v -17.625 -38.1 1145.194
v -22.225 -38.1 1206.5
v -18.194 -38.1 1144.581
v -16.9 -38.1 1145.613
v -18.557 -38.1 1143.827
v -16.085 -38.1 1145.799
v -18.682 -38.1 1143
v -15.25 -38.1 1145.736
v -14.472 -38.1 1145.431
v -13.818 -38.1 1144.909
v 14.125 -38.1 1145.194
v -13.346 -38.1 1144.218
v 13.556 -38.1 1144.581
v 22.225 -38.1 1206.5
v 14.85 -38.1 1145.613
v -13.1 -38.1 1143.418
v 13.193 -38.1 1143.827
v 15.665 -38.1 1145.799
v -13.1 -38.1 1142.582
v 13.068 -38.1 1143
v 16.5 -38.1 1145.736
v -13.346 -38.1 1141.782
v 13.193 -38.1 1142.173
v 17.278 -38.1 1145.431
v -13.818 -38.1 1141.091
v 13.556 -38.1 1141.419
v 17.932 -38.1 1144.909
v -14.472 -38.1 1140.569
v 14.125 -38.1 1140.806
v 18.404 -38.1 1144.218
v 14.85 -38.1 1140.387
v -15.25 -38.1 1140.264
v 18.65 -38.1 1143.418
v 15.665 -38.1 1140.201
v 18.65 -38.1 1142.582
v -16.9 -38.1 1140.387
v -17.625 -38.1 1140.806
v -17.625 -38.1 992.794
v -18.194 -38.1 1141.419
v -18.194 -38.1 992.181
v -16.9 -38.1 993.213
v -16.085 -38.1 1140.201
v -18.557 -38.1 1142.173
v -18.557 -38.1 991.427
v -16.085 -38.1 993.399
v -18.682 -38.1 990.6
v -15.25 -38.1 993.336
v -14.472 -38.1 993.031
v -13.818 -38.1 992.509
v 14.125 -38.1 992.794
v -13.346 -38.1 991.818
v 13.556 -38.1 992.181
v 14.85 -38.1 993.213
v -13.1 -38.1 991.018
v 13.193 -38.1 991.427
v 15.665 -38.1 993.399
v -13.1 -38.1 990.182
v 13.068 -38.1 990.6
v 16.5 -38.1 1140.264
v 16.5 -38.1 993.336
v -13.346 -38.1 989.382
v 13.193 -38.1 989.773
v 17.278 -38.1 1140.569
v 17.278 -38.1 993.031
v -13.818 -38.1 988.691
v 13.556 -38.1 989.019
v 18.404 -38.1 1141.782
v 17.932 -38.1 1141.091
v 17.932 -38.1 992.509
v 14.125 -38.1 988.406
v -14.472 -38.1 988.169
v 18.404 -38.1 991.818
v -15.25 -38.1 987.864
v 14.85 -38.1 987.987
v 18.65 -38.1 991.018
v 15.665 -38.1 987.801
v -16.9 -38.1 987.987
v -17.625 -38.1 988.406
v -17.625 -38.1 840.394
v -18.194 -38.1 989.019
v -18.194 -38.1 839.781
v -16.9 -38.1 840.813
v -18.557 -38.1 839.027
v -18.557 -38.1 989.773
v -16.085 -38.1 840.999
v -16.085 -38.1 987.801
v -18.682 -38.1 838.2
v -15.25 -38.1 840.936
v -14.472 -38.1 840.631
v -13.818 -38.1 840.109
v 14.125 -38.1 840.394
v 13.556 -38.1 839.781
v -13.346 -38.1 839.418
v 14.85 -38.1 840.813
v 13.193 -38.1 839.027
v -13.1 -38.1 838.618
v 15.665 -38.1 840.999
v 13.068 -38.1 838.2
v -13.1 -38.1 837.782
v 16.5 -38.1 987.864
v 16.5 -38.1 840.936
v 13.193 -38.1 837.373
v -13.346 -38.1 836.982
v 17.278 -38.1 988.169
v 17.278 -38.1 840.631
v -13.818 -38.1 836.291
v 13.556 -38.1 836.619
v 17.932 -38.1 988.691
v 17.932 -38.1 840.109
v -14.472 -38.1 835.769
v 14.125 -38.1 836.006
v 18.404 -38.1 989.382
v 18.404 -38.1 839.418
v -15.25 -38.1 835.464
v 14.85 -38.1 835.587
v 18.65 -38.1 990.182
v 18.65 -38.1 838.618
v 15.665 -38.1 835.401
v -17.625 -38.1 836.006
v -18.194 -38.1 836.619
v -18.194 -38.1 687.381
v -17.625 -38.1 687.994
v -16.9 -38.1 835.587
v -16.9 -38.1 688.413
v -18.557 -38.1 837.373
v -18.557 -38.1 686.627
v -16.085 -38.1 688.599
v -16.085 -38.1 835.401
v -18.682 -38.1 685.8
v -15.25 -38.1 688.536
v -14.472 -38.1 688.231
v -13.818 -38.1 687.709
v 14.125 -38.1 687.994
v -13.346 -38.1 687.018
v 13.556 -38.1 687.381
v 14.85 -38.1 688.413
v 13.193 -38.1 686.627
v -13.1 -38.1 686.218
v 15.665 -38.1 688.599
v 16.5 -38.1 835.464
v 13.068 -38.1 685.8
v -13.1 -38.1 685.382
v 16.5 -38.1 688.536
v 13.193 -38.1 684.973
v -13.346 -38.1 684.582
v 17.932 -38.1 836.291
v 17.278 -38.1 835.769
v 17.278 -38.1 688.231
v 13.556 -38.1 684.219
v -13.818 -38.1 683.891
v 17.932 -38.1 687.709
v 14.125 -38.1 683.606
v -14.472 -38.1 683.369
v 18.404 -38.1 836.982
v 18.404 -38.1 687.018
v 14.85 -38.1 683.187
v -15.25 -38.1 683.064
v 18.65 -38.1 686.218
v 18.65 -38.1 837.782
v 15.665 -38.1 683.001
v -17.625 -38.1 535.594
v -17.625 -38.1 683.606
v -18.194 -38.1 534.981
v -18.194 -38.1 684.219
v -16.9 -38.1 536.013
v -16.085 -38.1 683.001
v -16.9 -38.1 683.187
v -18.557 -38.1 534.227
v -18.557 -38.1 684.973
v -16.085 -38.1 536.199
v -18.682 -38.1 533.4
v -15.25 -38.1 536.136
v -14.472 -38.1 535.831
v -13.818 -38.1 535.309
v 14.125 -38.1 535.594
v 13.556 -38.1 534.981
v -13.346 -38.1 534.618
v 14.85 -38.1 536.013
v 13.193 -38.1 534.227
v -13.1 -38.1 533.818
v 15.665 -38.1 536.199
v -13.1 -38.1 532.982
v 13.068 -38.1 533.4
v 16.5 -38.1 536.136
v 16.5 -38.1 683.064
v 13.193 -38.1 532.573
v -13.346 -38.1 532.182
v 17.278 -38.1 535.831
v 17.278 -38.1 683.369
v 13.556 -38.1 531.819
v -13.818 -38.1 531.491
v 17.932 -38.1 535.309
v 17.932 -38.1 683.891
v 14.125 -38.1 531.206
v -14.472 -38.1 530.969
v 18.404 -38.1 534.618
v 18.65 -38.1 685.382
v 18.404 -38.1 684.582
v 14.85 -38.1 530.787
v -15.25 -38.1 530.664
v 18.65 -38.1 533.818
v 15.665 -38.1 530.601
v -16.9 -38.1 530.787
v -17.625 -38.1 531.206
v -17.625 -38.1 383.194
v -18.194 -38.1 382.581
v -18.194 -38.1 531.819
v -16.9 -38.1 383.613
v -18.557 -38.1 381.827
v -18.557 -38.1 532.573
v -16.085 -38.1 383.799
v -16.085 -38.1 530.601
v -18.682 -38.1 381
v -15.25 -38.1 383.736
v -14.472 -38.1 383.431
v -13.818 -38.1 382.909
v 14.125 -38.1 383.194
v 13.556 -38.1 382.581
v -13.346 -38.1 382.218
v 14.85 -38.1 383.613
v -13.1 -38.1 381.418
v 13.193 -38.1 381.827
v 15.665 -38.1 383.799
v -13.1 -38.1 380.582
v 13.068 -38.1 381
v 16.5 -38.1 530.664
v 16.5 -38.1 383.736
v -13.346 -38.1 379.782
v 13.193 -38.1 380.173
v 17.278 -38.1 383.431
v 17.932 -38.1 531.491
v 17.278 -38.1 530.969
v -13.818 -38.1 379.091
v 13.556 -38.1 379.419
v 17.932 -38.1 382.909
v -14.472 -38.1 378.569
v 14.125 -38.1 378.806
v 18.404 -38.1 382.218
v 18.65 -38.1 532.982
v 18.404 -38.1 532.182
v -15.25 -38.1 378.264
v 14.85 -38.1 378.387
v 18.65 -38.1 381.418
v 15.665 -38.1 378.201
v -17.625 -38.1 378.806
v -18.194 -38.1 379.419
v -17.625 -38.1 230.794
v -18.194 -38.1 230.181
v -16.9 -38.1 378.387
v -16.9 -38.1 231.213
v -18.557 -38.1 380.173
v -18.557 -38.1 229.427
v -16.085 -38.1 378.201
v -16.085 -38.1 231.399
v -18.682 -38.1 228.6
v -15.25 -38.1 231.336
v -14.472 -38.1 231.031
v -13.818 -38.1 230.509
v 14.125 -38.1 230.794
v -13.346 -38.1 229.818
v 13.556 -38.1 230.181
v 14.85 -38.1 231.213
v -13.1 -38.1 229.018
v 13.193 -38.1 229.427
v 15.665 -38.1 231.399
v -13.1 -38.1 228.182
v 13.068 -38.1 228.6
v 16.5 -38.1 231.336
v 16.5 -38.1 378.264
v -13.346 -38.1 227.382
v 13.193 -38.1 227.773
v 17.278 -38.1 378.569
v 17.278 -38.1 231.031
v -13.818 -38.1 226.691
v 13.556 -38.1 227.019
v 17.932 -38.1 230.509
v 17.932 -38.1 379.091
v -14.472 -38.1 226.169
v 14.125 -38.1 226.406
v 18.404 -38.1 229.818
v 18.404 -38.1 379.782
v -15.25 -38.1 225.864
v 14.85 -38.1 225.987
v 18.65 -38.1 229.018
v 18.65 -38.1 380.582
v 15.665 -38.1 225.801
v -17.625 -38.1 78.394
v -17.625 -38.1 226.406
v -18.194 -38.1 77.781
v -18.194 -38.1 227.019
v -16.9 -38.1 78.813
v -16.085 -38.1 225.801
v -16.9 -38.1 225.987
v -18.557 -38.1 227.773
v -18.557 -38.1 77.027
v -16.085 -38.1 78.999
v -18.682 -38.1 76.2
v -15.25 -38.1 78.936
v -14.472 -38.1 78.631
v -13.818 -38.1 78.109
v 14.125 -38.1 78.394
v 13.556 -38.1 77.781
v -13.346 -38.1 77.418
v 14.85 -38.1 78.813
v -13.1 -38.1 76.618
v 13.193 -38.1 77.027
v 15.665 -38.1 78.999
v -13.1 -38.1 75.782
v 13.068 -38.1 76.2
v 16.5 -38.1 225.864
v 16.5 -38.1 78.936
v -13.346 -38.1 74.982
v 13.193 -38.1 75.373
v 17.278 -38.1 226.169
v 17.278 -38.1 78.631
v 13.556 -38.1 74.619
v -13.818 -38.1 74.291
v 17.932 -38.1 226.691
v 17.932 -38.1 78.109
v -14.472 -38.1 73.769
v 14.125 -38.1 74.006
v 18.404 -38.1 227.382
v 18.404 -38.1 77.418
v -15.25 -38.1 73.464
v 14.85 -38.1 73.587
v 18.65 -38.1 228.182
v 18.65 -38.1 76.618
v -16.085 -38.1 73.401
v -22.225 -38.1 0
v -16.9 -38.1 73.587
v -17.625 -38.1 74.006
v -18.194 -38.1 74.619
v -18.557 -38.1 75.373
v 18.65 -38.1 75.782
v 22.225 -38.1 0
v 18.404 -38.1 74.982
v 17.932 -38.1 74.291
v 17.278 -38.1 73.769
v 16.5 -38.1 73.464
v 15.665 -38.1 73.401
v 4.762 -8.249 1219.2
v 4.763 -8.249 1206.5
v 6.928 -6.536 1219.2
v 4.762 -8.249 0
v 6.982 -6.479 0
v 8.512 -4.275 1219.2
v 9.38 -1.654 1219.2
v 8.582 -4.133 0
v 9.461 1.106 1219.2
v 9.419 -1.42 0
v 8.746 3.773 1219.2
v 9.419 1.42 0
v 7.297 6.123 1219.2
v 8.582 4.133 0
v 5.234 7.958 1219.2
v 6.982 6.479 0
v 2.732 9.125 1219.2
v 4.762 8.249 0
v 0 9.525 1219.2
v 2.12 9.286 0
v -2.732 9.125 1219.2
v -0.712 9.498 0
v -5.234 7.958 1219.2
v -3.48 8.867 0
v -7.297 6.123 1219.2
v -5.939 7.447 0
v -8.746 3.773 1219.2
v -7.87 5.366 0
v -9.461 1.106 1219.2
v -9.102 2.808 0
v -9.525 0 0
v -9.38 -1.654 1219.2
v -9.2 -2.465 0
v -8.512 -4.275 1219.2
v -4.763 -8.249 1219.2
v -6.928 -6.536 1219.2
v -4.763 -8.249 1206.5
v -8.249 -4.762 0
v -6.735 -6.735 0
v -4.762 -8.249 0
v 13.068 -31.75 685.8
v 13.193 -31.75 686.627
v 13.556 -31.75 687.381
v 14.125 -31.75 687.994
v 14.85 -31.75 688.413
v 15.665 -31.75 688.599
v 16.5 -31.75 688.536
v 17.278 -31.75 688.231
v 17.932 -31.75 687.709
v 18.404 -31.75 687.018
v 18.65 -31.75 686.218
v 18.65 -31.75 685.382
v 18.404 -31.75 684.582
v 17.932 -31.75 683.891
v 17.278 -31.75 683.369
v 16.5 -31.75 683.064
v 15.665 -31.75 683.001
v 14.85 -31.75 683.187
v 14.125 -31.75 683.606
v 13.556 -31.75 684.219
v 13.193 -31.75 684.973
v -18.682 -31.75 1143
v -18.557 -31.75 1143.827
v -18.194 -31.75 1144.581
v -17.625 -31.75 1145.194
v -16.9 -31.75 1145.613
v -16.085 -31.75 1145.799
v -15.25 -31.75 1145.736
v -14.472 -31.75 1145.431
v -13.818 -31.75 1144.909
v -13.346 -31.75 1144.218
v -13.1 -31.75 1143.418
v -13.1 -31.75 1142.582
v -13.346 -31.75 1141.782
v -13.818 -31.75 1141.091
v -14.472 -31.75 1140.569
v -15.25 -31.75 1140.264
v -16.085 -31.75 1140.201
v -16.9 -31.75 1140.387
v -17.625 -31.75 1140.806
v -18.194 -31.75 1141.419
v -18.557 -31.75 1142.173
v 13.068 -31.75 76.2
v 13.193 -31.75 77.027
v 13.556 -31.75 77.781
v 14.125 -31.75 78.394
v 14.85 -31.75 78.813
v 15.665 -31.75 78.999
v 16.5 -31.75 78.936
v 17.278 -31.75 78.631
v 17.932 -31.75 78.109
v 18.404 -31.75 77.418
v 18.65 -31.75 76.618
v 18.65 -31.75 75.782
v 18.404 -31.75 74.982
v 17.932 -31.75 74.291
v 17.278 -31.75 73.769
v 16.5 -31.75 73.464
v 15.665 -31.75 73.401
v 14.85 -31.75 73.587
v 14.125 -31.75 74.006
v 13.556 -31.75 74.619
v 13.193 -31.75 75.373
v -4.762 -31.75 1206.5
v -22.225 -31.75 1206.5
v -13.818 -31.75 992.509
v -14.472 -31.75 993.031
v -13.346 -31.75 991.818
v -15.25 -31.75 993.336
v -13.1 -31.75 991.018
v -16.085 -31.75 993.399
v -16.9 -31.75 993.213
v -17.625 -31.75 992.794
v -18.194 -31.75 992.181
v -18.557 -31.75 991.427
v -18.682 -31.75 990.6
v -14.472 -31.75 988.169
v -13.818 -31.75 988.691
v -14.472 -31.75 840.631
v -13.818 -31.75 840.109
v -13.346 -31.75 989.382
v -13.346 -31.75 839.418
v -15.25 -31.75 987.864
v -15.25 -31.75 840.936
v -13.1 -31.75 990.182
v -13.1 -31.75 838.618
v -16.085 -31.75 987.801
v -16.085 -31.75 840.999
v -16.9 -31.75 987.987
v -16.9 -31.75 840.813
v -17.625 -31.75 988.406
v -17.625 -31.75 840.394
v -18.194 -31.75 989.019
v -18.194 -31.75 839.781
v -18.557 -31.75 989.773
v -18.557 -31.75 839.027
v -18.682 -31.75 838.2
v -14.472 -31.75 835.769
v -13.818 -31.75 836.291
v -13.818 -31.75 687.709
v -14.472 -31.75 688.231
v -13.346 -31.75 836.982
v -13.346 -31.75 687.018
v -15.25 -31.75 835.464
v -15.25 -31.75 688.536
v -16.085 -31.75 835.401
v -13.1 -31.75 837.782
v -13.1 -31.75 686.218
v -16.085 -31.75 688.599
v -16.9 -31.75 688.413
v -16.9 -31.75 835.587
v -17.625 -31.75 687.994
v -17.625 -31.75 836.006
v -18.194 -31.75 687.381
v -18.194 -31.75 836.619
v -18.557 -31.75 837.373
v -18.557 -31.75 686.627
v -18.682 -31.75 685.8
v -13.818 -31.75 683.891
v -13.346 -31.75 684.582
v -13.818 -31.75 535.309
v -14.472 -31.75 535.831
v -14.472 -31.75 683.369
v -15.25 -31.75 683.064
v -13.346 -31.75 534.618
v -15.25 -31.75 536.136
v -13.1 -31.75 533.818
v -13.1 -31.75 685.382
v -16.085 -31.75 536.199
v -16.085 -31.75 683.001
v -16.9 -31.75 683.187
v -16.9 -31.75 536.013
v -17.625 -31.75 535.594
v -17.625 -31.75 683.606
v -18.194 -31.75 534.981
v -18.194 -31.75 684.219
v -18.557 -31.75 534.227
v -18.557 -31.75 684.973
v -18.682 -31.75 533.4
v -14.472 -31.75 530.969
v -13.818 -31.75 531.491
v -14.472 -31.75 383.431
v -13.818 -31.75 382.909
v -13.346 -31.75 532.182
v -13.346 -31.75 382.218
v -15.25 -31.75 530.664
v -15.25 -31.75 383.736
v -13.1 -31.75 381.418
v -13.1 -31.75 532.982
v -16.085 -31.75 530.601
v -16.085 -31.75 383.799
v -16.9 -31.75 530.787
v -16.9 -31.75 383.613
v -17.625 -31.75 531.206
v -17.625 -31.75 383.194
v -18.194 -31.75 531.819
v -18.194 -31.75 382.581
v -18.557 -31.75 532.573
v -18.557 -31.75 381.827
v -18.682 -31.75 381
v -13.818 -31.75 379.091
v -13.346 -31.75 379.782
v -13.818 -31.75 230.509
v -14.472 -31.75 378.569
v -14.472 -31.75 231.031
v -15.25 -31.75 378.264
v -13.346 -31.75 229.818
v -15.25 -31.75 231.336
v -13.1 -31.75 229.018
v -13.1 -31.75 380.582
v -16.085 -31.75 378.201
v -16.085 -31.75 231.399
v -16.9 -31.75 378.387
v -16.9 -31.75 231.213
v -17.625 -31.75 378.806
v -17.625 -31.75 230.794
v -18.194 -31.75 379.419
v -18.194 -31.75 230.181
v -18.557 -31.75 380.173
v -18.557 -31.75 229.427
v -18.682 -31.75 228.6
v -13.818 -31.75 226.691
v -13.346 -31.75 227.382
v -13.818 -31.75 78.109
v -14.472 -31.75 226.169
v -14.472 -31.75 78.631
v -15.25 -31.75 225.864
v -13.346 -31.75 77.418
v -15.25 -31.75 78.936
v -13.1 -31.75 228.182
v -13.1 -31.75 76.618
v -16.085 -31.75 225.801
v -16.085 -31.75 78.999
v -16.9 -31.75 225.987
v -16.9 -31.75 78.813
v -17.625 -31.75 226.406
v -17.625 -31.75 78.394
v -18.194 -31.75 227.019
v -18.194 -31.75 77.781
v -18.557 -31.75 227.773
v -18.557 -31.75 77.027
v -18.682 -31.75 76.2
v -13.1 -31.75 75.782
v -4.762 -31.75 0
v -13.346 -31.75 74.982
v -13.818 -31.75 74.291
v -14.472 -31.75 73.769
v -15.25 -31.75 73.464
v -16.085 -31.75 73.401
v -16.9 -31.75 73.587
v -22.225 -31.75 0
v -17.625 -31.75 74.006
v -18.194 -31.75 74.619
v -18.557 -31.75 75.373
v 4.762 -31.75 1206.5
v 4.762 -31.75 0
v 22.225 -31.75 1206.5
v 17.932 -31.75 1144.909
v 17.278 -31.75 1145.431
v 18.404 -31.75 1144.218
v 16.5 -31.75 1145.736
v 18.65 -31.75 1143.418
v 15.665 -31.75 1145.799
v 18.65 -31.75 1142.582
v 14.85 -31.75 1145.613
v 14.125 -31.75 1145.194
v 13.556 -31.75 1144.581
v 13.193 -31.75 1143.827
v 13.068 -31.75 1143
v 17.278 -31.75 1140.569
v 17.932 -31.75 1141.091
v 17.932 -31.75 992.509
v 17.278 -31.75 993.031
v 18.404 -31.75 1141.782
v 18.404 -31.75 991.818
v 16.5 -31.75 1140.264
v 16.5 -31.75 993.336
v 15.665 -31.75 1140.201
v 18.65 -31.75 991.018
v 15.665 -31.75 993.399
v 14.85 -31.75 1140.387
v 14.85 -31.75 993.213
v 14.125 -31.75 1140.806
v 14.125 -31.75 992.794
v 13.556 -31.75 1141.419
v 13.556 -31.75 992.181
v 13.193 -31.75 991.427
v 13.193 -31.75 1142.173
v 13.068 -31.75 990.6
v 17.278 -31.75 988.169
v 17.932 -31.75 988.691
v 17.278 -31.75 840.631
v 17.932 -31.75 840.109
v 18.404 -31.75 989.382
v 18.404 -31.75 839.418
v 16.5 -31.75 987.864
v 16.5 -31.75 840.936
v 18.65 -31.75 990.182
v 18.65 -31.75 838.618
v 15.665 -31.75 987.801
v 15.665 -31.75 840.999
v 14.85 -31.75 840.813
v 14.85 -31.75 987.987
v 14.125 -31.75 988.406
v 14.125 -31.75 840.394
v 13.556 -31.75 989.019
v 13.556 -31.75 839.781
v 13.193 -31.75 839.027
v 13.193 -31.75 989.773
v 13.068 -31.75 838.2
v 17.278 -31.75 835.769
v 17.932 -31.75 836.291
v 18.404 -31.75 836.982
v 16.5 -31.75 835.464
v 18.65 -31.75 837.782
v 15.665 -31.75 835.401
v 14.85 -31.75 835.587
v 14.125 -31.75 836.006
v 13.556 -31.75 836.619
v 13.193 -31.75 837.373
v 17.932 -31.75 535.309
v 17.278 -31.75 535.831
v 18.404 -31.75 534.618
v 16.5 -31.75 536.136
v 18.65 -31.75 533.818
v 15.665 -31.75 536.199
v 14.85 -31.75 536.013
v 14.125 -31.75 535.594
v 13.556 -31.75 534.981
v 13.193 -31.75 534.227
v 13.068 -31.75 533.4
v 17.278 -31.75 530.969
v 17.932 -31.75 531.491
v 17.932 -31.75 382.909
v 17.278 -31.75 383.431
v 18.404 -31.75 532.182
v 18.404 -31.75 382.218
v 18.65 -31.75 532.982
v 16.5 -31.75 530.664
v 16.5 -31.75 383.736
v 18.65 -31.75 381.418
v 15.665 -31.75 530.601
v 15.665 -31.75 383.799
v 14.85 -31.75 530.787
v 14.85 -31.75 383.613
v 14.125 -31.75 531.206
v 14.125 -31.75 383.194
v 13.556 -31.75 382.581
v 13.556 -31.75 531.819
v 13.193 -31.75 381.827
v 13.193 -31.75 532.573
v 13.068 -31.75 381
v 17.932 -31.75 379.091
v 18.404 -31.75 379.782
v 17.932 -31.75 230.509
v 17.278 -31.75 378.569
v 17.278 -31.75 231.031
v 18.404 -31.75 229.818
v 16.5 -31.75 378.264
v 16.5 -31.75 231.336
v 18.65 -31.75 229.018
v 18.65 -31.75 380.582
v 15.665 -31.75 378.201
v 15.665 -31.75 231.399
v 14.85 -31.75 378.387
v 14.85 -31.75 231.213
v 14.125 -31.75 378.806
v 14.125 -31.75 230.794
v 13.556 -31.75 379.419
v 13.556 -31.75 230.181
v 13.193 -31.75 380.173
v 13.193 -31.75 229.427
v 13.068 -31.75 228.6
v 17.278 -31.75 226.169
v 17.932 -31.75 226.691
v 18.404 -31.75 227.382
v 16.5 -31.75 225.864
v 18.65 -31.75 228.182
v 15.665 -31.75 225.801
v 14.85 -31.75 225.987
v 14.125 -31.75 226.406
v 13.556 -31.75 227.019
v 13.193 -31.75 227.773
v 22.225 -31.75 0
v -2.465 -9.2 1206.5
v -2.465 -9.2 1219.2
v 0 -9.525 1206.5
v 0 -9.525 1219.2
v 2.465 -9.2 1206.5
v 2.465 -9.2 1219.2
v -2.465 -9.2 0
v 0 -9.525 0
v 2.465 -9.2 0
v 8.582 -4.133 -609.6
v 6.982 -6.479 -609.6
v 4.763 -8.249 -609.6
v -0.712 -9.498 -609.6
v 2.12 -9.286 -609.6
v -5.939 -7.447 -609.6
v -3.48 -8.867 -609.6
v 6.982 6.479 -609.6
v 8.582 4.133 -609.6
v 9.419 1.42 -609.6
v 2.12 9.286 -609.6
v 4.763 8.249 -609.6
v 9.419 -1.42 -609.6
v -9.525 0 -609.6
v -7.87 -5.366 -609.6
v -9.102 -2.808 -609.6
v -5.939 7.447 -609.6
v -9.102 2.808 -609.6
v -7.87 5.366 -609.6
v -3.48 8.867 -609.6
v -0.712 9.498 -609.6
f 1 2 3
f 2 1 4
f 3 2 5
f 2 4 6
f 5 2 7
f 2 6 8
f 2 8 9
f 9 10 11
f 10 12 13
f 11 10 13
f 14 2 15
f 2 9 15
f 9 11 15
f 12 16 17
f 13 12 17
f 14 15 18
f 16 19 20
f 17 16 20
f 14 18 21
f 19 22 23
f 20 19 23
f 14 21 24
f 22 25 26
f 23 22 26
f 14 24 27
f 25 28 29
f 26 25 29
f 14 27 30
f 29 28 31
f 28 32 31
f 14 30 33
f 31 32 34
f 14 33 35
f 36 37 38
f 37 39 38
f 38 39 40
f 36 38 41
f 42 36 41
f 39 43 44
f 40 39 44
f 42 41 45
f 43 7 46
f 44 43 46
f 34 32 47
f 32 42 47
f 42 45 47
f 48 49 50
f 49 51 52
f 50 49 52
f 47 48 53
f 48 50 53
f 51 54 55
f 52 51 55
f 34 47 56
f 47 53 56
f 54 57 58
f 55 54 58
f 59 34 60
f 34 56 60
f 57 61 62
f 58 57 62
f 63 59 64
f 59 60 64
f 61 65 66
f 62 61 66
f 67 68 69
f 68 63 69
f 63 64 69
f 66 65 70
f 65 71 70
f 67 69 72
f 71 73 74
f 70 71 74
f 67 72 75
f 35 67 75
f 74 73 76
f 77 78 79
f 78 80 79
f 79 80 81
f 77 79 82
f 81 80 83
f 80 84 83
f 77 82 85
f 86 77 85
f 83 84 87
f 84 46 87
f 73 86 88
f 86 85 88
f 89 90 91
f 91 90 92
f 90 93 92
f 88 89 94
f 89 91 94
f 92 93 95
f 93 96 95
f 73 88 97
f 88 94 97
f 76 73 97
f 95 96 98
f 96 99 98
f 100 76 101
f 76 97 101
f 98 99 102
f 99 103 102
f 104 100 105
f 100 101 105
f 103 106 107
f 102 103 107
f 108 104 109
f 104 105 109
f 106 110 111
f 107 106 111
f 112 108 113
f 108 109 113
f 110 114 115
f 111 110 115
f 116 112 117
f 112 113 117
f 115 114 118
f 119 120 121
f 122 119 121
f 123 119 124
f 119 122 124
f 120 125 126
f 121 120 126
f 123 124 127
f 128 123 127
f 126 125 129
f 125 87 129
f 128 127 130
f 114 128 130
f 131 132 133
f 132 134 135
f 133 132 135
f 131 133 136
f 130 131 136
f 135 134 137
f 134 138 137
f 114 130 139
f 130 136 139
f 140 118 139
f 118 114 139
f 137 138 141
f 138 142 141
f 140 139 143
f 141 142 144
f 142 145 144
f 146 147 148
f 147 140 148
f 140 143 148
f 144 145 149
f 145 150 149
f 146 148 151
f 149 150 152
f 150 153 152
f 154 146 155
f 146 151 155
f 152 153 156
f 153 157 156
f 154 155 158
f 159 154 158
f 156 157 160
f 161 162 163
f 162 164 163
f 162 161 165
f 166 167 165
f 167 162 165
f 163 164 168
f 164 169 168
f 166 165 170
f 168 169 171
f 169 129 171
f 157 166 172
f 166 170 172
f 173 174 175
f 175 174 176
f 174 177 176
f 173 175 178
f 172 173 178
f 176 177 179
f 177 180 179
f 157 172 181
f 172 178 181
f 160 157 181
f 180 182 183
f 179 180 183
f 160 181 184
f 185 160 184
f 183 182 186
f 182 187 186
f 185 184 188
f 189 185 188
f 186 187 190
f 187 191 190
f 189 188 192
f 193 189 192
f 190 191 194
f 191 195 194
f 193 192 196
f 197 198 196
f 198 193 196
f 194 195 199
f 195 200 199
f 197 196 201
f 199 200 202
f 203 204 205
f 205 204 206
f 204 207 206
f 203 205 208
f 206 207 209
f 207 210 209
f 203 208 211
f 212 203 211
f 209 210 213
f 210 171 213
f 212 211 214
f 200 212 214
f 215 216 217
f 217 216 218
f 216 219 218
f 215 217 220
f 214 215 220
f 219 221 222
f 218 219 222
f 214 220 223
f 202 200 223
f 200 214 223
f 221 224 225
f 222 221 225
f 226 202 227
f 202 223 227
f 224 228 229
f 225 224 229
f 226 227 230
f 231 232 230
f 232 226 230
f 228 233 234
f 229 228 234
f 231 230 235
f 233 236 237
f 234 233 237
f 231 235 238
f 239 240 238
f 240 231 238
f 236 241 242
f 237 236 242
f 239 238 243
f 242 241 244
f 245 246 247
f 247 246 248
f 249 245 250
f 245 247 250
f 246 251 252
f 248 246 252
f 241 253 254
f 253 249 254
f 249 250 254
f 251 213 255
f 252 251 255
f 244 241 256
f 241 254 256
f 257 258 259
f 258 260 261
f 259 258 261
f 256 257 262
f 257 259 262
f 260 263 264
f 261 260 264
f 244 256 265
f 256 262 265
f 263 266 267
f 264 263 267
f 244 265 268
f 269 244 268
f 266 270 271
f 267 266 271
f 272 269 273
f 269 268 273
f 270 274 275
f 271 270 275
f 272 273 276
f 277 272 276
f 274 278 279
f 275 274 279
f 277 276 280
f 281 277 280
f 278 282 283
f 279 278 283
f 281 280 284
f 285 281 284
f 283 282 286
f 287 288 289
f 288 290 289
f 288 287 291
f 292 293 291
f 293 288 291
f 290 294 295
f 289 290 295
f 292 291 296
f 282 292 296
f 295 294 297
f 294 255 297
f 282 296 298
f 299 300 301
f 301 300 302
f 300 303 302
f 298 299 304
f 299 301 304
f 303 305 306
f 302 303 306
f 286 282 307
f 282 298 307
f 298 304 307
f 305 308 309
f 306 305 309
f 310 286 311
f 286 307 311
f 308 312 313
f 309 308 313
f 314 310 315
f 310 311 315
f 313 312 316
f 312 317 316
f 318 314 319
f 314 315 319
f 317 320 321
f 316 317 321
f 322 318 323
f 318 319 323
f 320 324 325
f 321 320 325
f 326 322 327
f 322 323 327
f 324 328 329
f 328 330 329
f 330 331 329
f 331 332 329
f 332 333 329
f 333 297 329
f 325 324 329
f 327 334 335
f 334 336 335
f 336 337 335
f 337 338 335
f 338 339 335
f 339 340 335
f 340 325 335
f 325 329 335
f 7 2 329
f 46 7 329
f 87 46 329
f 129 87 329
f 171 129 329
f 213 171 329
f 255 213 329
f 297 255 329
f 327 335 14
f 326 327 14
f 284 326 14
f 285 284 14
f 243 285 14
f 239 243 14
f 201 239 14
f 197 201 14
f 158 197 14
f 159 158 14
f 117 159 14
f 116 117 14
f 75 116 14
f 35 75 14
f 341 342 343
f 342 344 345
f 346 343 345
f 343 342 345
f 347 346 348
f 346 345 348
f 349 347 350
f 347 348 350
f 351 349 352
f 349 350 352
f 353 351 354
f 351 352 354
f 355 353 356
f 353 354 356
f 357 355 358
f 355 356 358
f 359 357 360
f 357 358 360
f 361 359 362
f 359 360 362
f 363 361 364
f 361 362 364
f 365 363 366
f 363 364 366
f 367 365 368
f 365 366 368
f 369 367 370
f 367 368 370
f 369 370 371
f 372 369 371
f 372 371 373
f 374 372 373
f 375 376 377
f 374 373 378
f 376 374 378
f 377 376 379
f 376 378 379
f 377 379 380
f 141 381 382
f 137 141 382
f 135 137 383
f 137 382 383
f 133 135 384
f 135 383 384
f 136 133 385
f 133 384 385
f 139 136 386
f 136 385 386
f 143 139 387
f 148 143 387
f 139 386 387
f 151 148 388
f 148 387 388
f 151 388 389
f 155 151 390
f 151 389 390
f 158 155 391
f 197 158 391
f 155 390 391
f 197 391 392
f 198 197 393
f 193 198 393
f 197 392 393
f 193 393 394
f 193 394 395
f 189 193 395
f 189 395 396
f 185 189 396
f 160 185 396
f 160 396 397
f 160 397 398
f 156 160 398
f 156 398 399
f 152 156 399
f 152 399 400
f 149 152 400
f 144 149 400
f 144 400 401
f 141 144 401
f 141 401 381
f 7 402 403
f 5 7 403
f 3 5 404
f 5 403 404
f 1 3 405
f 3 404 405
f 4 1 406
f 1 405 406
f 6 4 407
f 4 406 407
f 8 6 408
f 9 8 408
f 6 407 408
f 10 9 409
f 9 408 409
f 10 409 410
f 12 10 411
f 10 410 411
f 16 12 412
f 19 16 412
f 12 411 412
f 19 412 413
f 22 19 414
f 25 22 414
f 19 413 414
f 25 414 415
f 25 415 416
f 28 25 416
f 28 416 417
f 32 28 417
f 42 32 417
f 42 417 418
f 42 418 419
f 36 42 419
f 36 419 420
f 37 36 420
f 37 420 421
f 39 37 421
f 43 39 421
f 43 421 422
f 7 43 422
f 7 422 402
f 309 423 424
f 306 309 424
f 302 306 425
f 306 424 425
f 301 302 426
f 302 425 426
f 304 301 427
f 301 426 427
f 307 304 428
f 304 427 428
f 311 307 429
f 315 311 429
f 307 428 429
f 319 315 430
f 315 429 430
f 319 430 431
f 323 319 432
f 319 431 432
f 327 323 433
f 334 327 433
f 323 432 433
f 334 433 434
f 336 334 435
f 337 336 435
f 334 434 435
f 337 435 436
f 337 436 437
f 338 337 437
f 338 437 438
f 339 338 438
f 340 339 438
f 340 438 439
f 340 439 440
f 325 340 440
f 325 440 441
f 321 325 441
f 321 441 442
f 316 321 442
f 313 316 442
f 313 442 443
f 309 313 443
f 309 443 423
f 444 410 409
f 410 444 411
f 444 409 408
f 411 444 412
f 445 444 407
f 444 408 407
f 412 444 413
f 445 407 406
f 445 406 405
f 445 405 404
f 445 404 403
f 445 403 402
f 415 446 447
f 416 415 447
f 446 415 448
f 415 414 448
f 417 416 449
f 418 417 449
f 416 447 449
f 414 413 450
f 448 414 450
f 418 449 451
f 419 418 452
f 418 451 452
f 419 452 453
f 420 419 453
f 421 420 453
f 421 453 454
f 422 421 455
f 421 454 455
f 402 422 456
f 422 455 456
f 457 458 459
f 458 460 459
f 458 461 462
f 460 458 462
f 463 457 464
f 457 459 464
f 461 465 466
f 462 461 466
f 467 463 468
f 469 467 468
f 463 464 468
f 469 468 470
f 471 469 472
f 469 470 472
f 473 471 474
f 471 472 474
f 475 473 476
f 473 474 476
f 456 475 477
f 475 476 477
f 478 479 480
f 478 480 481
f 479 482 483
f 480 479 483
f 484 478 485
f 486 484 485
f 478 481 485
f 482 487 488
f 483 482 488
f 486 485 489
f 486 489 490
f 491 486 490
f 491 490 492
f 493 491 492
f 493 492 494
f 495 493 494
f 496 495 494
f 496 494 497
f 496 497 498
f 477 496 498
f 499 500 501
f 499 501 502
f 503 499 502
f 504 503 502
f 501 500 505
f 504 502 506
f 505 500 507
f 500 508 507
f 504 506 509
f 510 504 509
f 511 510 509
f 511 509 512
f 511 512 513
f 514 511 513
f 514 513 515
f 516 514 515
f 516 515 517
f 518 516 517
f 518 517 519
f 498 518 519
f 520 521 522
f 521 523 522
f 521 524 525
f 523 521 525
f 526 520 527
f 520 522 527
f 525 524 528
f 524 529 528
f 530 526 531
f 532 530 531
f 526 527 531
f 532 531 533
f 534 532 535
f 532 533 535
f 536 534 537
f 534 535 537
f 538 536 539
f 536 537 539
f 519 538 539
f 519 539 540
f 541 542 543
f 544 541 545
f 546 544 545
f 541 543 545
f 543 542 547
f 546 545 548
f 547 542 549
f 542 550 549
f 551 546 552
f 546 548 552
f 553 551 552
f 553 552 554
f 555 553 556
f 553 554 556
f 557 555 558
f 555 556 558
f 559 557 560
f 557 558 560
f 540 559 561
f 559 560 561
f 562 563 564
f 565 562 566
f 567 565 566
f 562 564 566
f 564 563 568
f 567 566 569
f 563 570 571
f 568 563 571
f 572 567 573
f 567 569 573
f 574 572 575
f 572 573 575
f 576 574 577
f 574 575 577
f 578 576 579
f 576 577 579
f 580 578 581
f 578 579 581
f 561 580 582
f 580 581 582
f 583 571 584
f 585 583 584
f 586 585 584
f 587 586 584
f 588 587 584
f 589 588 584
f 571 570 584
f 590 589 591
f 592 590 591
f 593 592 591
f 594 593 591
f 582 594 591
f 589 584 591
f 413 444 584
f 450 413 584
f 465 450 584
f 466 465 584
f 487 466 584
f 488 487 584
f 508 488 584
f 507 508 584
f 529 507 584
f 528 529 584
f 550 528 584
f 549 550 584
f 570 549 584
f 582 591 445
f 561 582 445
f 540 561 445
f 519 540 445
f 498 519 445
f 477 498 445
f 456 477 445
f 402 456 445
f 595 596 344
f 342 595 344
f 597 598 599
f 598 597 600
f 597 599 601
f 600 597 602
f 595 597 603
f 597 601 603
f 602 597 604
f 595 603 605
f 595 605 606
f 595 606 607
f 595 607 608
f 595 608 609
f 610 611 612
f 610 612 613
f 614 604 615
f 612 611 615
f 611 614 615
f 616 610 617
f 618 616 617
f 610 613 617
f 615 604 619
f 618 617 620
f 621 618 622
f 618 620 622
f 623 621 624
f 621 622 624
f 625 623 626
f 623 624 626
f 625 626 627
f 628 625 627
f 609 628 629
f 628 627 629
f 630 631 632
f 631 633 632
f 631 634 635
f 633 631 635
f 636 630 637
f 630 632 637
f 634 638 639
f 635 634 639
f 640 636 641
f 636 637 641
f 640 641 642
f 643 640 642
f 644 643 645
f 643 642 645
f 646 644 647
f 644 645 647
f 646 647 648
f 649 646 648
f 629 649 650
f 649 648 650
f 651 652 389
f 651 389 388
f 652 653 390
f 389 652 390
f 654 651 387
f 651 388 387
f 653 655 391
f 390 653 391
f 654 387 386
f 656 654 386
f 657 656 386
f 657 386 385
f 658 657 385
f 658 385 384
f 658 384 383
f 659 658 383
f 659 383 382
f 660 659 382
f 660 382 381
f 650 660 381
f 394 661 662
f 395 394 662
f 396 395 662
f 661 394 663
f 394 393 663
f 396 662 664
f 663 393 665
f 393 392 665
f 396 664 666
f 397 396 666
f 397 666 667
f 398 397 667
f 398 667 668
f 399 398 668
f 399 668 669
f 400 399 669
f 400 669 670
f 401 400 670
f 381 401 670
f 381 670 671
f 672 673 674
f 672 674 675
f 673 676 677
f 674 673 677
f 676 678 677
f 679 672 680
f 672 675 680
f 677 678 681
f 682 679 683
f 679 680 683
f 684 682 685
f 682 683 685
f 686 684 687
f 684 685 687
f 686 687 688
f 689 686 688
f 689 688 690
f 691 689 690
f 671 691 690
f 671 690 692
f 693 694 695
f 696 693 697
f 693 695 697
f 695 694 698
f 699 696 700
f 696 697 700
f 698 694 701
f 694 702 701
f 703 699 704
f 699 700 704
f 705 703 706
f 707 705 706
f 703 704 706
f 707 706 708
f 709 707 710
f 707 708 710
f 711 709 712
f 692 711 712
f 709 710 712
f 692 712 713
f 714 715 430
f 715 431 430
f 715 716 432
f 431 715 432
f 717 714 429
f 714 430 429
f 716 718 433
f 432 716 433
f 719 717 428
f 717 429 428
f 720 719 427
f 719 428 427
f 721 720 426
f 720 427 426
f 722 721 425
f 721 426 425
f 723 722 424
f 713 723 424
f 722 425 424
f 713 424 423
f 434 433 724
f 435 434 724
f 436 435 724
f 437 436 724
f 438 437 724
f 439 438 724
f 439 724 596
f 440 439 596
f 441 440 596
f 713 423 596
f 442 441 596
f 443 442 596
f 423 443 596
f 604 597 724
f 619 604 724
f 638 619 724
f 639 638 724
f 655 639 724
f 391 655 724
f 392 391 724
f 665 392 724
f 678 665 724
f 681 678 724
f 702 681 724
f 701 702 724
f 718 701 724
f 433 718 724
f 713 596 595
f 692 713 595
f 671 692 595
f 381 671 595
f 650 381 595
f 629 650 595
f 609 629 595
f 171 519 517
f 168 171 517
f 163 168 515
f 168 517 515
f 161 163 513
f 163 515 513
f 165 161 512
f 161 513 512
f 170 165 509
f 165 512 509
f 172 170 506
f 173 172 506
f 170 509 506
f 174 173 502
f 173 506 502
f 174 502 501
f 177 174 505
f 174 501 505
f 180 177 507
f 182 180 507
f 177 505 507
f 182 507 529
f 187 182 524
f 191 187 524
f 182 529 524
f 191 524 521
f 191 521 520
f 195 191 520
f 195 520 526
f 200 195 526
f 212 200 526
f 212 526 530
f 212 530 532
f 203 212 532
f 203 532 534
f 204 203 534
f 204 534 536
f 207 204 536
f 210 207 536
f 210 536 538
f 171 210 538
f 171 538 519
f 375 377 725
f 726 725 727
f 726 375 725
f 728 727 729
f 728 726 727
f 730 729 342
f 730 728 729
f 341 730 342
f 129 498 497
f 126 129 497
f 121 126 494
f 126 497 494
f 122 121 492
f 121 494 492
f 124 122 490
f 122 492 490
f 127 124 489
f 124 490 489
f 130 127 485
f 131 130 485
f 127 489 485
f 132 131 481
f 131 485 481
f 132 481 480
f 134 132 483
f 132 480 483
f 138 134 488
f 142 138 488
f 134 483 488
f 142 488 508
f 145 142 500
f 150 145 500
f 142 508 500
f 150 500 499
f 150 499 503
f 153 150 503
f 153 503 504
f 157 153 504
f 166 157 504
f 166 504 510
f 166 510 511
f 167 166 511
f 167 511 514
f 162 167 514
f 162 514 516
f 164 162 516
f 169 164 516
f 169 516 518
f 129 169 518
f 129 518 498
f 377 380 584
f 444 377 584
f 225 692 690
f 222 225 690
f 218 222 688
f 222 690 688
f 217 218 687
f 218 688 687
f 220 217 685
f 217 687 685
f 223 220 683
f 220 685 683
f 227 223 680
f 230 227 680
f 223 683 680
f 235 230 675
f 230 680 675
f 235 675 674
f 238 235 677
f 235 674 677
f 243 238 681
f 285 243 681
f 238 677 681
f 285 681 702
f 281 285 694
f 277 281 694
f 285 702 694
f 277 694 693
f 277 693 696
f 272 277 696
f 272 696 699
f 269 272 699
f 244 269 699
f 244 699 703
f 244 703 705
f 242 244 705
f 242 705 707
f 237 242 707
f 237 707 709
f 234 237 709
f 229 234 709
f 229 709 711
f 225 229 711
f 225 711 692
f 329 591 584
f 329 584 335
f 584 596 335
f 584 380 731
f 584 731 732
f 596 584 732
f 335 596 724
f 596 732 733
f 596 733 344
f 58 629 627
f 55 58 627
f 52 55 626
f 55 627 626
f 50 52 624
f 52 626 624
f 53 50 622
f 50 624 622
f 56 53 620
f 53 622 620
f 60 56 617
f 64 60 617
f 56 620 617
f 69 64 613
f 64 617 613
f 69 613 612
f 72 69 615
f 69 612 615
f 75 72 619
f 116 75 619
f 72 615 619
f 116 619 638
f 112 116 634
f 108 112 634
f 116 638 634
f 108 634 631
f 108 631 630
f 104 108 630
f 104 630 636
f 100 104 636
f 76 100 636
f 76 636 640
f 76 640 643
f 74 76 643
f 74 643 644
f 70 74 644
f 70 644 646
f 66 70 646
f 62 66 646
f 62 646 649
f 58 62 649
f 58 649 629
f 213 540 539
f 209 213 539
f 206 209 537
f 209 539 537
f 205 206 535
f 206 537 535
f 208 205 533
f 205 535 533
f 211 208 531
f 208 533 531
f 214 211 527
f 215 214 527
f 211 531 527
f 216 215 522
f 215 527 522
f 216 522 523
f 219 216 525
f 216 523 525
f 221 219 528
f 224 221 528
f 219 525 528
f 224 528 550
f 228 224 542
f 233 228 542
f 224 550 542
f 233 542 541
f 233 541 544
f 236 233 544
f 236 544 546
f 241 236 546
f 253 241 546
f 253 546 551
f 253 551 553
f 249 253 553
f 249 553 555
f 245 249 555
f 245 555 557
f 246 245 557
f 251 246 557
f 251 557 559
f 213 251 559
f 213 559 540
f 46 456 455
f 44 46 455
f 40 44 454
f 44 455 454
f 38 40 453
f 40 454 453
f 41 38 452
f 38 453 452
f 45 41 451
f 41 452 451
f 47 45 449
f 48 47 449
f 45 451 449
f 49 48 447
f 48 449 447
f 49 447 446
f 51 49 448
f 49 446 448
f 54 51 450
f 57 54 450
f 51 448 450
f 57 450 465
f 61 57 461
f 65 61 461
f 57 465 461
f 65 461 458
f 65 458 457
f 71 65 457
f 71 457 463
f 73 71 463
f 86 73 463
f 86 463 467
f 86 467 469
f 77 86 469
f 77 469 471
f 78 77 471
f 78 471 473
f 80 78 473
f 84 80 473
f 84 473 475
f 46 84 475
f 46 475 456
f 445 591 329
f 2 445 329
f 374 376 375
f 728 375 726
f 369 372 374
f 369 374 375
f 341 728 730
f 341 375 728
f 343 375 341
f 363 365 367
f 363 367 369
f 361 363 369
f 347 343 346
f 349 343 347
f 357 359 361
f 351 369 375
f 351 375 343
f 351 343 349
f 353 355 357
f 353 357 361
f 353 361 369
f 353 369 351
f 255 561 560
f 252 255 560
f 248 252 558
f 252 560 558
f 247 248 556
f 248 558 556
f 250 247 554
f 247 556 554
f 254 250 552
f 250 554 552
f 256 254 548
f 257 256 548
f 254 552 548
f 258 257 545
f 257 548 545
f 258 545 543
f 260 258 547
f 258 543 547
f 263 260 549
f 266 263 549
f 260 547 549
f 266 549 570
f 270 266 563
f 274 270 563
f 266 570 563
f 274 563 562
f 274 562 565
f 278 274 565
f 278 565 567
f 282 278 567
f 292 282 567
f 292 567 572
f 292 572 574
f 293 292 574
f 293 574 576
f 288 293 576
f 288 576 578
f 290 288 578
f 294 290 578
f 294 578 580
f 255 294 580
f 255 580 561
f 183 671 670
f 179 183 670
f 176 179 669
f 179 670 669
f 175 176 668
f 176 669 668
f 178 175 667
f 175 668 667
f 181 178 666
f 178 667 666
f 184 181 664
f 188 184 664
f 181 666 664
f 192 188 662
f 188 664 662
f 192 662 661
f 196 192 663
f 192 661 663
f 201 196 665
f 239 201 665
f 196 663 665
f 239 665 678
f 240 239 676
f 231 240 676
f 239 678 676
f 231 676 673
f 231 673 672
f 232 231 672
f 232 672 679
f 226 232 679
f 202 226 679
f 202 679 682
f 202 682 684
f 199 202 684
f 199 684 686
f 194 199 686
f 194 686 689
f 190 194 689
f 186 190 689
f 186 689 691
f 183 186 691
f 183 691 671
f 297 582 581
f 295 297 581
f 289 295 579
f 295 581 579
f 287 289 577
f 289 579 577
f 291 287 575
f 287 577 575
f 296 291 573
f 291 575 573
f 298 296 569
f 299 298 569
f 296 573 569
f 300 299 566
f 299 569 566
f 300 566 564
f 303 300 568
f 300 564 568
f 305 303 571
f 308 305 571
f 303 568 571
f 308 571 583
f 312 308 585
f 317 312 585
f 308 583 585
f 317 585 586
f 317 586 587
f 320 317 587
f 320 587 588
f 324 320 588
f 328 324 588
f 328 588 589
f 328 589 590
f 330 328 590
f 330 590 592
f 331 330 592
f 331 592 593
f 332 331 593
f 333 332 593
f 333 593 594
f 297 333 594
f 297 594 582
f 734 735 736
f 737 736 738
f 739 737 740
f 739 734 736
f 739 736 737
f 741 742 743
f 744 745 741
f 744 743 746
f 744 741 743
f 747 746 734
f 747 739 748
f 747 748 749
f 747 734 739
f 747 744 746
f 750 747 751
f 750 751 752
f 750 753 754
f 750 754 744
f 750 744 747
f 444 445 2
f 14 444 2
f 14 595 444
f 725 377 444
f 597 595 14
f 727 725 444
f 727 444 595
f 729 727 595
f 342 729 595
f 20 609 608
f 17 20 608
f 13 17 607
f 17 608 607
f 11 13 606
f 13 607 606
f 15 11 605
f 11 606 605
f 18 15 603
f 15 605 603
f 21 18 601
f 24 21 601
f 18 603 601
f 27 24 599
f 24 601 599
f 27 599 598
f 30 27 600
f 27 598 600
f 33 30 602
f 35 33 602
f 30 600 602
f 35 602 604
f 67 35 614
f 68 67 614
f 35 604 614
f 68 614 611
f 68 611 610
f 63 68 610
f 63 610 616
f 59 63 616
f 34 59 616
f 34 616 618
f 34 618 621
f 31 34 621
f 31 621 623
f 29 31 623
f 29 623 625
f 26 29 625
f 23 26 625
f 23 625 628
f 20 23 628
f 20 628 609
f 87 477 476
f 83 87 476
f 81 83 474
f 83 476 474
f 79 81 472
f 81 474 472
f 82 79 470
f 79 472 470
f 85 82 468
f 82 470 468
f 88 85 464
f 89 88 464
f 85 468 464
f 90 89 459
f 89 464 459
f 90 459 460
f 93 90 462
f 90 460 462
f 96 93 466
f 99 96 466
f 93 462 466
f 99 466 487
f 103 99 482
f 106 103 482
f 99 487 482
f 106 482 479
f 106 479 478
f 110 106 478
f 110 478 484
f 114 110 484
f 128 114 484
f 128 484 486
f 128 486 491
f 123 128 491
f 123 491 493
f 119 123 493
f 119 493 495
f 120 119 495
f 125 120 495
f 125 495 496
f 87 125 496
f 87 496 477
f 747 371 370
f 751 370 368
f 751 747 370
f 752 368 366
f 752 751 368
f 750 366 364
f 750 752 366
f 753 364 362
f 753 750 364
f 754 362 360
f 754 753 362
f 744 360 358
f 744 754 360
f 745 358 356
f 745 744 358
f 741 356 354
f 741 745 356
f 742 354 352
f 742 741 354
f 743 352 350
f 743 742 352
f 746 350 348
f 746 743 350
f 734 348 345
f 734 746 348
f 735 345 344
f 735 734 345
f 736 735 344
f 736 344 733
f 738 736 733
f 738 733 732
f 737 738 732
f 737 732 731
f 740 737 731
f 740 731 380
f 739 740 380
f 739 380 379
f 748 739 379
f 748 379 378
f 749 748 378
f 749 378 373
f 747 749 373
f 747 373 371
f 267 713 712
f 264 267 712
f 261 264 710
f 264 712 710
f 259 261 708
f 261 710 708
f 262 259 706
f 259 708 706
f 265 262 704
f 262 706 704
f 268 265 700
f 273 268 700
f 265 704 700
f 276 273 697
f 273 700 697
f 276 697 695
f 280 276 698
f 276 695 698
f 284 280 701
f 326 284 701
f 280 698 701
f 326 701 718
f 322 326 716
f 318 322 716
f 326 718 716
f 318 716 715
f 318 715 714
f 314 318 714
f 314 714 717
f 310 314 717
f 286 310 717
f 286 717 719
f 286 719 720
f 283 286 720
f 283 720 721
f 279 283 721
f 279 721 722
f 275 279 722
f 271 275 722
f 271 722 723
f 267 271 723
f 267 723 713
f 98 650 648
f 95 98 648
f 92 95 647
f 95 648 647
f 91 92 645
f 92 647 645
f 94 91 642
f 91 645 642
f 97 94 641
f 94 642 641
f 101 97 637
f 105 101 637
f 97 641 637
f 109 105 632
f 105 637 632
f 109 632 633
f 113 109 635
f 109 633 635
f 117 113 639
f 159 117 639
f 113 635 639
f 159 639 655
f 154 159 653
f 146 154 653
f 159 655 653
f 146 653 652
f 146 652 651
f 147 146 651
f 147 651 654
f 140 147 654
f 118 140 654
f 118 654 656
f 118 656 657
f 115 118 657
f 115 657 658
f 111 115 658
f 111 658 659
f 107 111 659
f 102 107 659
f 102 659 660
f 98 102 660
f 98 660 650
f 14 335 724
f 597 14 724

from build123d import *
from build123d.topology import SkipClean

# Parameters (mm, degrees)
EXTRUDE1_DEPTH         = 1219.2
F_10_CLEARANCE_HOLE1_D = 5.6134
LPATTERN3_COUNT        = 8
LPATTERN3_PITCH        = 152.4
SKETCH4_OUTSIDE_W      = 290.638
SKETCH4_OUTSIDE_H      = 293.813
SKETCH4_OUTSIDE_R      = 9.525
CUT_EXTRUDE1_DEPTH     = 12.7
EXTRUDE2_START         = 609.6
SKETCH5_R              = 9.525
EXTRUDE2_DEPTH         = 609.6


with BuildPart() as part:
    # Sketch1 → Extrude1 (new body)
    with BuildSketch(Plane.XY):
        with BuildLine():
            Line((-22.225, -38.1), (22.225, -38.1))
            Line((22.225, -38.1), (22.225, -31.75))
            Line((22.225, -31.75), (4.7625, -31.75))
            Line((4.7625, -31.75), (4.7625, -8.248891971))
            ThreePointArc((4.7625, -8.248891971), (0, 9.525), (-4.7625, -8.248891971))
            Line((-4.7625, -8.248891971), (-4.7625, -31.75))
            Line((-4.7625, -31.75), (-22.225, -31.75))
            Line((-22.225, -31.75), (-22.225, -38.1))
        make_face()
    extrude(amount=EXTRUDE1_DEPTH)

    # #10 Clearance Hole1 (through all)
    with Locations(Plane.XZ.offset(38.1)):
        with Locations((-15.875, 76.2), (15.875, 76.2)):
            f_10_clearance_hole1 = Hole(F_10_CLEARANCE_HOLE1_D / 2)

    # LPattern3: #10 Clearance Hole1 ×8
    with Locations(*[(0, 0, i * LPATTERN3_PITCH) for i in range(1, LPATTERN3_COUNT)]):
        add(f_10_clearance_hole1, mode=Mode.SUBTRACT)

    # Sketch4 outside → Cut-Extrude1 (cut)
    with BuildSketch(Plane.XY.offset(1219.2)):
        with Locations((0, -14.2875)):
            Rectangle(SKETCH4_OUTSIDE_W, SKETCH4_OUTSIDE_H)
        with Locations(Location((0, 0, 0), (0, 0, 240))):
            Circle(SKETCH4_OUTSIDE_R, mode=Mode.SUBTRACT)
    extrude(amount=-CUT_EXTRUDE1_DEPTH, mode=Mode.SUBTRACT)

    # Sketch5 → Extrude2 (add)
    with SkipClean():  # the faces are left unmerged after this step: merging them gives an invalid solid
        with BuildSketch(Plane(origin=(0, 0, 0), x_dir=(-1, 0, 0), z_dir=(0, 0, -1)).offset(EXTRUDE2_START)):
            Circle(SKETCH5_R)
        extrude(amount=-EXTRUDE2_DEPTH)


solid = part.part
